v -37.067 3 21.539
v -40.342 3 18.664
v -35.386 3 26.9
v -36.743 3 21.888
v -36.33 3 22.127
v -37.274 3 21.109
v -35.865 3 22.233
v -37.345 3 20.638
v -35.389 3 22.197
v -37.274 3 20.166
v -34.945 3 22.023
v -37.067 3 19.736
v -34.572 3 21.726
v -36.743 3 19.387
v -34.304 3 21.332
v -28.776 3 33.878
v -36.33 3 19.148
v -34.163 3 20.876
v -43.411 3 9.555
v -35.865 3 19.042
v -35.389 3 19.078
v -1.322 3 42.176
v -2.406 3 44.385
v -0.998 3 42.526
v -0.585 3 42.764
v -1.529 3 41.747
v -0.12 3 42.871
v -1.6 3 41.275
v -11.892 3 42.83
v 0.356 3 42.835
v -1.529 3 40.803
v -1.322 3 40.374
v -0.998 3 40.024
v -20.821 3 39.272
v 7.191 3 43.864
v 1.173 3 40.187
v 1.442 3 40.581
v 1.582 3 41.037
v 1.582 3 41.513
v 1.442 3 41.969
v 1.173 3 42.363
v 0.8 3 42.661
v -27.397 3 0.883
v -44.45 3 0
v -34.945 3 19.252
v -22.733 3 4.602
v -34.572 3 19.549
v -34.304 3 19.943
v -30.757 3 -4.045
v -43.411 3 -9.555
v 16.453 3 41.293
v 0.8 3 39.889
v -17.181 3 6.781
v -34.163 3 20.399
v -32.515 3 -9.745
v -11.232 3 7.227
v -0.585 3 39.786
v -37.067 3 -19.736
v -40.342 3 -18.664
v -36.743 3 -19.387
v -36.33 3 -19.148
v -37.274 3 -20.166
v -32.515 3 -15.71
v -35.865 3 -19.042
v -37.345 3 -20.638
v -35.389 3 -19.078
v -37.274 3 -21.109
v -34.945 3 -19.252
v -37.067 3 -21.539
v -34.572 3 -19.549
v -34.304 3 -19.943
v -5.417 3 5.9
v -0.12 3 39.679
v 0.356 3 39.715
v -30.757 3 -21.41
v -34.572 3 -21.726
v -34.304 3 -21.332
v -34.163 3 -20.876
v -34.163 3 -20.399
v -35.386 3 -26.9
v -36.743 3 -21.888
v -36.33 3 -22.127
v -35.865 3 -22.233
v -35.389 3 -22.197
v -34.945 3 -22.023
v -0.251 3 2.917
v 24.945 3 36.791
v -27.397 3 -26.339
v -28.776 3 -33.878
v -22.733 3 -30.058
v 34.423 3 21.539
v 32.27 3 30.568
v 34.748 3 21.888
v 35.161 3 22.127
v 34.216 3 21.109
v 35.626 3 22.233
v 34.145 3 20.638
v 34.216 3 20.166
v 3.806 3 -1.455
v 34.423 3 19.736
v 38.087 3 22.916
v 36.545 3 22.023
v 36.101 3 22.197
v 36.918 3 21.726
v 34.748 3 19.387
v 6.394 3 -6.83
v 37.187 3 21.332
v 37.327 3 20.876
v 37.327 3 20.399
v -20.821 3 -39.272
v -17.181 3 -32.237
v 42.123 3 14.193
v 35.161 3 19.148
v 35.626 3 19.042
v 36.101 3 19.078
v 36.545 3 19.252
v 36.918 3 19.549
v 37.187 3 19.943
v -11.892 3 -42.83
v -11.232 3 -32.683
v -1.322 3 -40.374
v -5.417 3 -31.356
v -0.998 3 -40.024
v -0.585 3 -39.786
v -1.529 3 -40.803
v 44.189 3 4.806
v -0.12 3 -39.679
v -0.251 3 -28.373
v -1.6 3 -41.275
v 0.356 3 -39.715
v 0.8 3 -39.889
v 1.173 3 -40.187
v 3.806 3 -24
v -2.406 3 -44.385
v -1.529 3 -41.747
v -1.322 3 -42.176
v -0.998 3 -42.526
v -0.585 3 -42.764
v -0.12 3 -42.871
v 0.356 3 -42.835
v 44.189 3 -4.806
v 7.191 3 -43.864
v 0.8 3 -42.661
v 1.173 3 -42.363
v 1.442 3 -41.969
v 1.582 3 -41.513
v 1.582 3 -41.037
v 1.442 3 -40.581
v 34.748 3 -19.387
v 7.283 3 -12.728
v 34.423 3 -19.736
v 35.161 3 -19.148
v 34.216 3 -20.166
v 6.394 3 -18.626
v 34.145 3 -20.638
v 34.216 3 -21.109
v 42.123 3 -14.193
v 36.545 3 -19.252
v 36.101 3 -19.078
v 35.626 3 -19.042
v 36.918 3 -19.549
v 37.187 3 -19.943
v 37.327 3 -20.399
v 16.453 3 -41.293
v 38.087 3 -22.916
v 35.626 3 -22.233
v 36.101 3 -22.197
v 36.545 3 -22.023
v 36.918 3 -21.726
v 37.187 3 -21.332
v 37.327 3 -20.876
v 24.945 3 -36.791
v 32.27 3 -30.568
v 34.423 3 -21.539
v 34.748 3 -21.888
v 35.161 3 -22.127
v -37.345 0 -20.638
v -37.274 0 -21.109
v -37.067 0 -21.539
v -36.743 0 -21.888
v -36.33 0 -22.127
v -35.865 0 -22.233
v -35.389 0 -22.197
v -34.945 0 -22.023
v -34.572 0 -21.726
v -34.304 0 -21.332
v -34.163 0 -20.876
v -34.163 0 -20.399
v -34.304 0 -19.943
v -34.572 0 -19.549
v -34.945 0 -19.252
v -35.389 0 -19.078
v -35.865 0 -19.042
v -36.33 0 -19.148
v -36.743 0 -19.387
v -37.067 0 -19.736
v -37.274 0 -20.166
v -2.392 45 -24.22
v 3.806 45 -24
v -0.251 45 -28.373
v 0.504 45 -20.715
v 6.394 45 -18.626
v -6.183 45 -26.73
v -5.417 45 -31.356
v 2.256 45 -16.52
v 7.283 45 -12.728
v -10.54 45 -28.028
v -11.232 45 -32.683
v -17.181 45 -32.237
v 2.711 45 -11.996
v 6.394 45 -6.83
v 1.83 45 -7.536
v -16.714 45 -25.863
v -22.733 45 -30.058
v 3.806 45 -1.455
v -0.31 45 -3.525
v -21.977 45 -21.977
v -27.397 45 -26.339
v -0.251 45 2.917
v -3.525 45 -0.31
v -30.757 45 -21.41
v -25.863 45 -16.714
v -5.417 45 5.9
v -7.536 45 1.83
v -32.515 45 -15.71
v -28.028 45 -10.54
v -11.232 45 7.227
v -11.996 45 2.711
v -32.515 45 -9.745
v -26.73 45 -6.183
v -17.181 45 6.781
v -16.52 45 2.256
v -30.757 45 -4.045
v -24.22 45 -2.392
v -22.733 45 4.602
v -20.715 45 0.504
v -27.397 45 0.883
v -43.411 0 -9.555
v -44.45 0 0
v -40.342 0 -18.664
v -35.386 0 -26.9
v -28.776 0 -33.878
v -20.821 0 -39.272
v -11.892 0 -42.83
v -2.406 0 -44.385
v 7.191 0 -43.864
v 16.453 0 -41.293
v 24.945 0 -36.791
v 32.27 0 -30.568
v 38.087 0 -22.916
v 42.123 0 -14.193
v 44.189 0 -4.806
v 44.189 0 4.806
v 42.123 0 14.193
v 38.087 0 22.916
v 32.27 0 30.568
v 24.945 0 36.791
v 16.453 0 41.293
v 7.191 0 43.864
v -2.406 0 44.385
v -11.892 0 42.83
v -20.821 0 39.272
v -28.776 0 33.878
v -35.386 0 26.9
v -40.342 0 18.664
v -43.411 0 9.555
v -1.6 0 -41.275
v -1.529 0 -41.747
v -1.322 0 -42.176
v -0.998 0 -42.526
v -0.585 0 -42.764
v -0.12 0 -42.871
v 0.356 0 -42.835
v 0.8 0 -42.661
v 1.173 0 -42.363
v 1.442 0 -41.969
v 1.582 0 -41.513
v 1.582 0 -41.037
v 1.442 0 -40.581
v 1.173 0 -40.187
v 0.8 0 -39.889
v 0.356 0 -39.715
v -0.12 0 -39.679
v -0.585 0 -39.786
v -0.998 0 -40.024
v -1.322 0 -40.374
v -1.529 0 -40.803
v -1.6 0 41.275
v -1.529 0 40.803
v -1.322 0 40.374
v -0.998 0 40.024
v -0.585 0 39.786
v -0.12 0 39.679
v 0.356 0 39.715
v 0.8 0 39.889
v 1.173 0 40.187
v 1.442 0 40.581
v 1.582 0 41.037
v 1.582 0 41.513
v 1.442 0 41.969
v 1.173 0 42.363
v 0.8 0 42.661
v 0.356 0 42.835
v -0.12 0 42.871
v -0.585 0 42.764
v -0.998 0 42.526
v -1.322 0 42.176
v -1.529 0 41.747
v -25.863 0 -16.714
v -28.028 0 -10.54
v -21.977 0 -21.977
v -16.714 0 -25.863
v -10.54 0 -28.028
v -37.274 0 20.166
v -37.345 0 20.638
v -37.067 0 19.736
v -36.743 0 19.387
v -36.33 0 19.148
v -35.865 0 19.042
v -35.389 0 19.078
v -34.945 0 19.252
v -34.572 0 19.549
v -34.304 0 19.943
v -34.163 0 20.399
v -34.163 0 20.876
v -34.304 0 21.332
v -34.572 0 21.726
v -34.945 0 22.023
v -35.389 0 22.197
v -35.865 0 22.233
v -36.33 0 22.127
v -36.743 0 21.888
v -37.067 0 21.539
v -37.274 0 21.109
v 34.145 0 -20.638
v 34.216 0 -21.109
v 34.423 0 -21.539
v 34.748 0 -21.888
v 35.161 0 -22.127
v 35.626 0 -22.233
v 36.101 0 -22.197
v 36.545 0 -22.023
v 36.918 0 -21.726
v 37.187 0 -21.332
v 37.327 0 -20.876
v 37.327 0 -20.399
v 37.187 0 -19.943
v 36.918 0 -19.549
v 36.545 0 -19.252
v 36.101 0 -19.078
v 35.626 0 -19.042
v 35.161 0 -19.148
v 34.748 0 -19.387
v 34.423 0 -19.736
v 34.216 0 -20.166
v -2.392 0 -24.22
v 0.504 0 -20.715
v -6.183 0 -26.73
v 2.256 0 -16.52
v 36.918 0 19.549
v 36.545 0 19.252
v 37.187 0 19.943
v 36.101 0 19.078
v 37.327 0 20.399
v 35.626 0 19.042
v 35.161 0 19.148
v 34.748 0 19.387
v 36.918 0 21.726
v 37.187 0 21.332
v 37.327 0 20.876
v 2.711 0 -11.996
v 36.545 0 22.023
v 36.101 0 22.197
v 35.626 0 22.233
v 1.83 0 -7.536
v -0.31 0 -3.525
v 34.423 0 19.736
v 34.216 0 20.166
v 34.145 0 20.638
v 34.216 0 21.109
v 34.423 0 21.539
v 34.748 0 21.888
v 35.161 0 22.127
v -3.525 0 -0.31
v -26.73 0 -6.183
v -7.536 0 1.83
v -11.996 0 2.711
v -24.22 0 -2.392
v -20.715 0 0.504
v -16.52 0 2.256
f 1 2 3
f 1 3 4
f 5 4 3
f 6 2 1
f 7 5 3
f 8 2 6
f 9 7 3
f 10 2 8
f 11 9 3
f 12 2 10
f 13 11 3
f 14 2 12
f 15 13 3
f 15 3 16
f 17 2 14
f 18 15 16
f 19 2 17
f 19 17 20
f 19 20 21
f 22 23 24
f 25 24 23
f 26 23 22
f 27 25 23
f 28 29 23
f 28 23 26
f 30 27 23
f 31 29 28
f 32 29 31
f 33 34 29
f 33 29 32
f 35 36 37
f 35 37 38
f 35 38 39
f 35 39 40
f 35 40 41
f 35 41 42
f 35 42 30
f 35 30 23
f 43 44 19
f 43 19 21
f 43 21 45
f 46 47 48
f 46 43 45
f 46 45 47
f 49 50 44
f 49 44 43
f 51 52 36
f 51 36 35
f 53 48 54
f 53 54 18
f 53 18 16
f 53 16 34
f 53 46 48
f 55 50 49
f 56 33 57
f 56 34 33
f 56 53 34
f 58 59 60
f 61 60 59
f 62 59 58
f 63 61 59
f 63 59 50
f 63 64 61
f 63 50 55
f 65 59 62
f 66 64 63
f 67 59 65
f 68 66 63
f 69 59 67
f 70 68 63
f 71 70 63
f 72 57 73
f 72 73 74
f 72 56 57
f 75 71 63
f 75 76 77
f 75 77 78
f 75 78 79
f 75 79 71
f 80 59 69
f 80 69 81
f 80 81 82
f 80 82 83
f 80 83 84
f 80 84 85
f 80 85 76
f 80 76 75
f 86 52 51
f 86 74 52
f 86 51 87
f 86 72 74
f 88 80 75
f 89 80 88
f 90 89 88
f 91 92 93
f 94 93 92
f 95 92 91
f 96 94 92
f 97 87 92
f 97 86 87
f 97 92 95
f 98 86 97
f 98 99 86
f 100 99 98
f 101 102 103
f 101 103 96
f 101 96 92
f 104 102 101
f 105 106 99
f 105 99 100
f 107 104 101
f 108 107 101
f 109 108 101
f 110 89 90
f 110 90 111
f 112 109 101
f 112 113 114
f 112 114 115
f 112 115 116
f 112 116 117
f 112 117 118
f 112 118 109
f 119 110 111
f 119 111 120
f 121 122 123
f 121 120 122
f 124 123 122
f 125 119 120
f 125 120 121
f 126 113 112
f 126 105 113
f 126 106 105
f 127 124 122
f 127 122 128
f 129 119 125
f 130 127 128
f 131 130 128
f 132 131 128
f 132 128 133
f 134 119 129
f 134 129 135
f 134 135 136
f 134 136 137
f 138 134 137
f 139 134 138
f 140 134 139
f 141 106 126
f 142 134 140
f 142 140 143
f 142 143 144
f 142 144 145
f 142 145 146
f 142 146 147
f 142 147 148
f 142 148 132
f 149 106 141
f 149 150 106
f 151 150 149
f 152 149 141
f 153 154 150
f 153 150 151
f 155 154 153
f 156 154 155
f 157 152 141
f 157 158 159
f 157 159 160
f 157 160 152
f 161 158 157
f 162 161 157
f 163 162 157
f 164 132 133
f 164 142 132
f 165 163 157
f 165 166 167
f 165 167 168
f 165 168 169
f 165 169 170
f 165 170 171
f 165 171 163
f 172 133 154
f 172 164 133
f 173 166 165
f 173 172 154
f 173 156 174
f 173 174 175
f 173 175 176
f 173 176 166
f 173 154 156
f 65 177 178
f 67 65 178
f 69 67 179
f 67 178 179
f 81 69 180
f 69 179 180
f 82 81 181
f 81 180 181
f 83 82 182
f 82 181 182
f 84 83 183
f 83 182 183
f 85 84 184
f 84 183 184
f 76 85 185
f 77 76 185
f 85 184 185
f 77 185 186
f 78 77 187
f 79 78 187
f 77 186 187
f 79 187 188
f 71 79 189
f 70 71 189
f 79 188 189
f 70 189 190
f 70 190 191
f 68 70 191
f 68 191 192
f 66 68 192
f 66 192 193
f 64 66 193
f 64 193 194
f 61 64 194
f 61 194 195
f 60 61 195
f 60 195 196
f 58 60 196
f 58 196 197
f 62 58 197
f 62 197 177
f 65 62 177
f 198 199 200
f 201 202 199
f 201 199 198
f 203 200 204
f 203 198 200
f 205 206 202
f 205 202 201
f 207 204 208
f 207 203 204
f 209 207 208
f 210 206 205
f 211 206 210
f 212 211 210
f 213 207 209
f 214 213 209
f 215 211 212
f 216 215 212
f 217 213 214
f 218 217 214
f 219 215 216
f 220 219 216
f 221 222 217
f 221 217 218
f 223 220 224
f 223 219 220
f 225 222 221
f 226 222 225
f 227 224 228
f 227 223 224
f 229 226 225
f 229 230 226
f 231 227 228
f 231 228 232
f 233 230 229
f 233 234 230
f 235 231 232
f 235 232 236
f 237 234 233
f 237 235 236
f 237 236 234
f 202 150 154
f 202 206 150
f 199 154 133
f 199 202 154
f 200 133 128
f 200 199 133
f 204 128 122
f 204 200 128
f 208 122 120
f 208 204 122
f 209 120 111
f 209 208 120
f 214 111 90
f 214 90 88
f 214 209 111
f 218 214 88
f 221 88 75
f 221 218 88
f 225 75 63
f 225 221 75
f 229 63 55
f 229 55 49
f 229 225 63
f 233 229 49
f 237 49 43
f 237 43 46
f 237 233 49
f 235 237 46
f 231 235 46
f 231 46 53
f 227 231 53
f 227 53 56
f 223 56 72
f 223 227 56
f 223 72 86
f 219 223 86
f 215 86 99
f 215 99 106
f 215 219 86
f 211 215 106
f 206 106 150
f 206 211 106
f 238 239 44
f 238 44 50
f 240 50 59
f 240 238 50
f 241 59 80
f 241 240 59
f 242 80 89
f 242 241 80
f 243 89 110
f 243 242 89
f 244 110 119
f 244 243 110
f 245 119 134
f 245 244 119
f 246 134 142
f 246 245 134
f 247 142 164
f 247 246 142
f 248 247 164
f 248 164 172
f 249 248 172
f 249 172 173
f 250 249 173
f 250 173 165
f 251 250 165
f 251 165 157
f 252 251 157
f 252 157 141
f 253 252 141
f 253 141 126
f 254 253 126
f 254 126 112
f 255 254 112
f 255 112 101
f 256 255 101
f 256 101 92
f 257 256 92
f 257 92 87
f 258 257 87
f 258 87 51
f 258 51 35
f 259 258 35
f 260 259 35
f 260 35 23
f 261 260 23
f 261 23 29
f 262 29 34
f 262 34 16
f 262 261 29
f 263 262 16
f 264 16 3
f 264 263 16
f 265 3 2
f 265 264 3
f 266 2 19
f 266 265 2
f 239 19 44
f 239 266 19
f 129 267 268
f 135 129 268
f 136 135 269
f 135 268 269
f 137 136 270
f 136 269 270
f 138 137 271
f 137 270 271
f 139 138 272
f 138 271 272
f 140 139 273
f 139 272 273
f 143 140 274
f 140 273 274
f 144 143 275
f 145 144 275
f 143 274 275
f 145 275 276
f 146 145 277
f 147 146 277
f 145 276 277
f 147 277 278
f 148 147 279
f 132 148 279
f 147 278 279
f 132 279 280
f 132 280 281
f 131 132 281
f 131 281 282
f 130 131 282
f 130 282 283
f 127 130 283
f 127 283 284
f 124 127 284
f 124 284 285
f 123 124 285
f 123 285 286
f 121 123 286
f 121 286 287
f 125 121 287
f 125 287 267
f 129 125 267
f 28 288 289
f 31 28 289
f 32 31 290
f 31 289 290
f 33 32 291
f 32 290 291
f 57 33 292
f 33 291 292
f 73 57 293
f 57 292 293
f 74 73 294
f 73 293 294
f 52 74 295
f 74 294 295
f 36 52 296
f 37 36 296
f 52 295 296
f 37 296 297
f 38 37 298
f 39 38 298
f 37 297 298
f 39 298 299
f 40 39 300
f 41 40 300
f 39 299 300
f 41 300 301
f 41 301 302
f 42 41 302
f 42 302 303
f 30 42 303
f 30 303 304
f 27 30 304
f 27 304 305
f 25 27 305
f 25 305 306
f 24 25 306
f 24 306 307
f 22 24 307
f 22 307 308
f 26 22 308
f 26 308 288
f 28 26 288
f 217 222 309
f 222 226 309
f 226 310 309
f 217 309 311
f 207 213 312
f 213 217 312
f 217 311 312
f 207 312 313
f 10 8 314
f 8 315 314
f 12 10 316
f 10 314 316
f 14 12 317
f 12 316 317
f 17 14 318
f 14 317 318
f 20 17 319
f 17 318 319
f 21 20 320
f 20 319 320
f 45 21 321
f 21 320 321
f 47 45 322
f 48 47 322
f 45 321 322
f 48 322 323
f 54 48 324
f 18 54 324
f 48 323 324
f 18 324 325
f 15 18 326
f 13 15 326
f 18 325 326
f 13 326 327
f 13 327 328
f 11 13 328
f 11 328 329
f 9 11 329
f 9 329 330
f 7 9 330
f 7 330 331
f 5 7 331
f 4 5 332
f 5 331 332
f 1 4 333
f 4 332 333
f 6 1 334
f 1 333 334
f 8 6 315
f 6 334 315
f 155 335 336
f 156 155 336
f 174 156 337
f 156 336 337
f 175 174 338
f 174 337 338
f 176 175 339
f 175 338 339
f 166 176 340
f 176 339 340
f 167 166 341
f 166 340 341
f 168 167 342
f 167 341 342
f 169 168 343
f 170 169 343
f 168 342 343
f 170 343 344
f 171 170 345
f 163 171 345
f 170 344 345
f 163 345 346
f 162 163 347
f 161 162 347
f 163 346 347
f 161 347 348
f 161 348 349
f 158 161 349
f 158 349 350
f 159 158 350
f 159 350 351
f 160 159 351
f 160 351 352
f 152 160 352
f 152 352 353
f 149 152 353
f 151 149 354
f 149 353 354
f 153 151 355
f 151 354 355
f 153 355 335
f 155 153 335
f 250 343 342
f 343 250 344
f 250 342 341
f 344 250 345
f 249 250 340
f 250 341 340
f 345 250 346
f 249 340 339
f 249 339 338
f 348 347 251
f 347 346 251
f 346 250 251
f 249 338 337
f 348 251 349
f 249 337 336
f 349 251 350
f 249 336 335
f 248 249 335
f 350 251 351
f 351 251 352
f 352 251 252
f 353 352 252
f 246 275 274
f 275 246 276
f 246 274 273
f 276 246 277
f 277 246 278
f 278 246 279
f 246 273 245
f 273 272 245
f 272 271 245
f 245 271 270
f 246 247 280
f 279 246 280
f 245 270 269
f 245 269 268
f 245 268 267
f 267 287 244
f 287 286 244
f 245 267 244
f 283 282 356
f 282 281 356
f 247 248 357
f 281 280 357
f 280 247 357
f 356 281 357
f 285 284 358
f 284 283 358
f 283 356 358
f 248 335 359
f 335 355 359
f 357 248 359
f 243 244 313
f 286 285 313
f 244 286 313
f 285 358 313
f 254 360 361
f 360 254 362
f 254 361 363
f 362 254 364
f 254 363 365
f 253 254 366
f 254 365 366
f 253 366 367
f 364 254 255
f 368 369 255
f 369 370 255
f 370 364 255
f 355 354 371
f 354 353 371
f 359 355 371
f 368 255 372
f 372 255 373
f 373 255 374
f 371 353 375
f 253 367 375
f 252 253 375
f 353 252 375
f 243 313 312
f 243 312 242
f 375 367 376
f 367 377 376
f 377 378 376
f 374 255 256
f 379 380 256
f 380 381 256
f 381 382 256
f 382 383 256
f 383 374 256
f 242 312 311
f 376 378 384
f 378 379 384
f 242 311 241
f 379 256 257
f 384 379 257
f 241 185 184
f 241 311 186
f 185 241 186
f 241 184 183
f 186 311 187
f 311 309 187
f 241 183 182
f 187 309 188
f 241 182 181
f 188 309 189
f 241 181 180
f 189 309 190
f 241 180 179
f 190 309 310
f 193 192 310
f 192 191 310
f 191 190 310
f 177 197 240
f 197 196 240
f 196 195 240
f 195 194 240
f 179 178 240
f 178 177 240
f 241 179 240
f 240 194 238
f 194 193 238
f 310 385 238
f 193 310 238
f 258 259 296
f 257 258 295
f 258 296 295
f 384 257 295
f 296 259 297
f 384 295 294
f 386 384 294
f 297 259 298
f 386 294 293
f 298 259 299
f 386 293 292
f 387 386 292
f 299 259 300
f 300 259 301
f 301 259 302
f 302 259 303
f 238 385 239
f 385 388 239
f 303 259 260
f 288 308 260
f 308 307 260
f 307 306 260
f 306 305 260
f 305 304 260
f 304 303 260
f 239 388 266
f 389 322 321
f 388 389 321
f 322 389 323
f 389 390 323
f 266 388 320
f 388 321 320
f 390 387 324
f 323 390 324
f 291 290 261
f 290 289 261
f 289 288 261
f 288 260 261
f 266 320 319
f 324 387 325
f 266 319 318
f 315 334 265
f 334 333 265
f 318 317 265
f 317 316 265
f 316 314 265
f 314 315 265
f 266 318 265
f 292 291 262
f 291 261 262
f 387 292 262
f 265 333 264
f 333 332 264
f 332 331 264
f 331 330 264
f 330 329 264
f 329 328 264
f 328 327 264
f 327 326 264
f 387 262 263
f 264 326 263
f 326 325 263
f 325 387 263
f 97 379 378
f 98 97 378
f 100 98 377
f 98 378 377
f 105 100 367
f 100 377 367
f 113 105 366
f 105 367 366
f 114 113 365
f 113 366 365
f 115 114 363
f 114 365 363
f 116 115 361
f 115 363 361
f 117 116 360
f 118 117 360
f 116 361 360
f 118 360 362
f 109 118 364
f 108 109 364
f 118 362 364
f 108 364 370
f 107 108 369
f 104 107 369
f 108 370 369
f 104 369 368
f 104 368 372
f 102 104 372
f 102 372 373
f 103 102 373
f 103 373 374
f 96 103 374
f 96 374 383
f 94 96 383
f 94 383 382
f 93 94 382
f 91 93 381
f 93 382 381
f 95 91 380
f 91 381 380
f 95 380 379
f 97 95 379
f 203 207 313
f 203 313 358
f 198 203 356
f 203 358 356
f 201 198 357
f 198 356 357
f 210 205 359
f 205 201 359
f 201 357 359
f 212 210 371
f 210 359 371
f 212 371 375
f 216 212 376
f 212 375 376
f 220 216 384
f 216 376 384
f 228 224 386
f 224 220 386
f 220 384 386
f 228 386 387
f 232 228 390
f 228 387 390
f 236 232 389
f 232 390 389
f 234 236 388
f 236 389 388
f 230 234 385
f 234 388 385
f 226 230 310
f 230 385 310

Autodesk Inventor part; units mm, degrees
ref_plane "YZ Plane" through (0, 0, 0) normal (1, 0, 0) x (0, 1, 0)
ref_plane "XZ Plane" through (0, 0, 0) normal (0, 1, 0) x (-1, 0, 0)
ref_plane "XY Plane" through (0, 0, 0) normal (0, 0, 1) x (1, 0, 0)
sketch "Sketch1" plane through (0, 0, 0) normal (0, 1, 0) x (-1, 0, 0)
  circle A0 centre (0, 0) radius 44.45
  circle A1 centre (0, -41.275) radius 1.6
  circle A2 centre (35.7452, -20.6375) radius 1.6
  circle A3 centre (-35.7452, -20.6375) radius 1.6
  circle A4 centre (0, 41.275) radius 1.6
  circle A5 centre (35.7452, 20.6375) radius 1.6
  circle A6 centre (-35.7452, 20.6375) radius 1.6
  arc A7 (28.0281, -10.5398) -> (10.5398, -28.0281) centre (12.7279, -12.7279) ccw
  arc A8 (10.5398, -28.0281) -> (28.0281, -10.5398) centre (6.4322, -6.4322) ccw
extrude "Extrusion1" add sketch "Sketch1" along normal blind 45
sketch "Sketch2" plane through (0, 45, 0) normal (0, 1, 0) x (1, 0, 0)
  arc A0 (-28.0281, 10.5398) -> (-10.5398, 28.0281) centre (-12.7279, 12.7279) ccw projected
  circle A1 centre (-12.7279, 12.7279) radius 20.011
  circle A2 centre (0, 0) radius 44.45
extrude "Extrusion2" cut sketch "Sketch2" against normal blind 42
properties part number "Potting_Jig_Internal"
